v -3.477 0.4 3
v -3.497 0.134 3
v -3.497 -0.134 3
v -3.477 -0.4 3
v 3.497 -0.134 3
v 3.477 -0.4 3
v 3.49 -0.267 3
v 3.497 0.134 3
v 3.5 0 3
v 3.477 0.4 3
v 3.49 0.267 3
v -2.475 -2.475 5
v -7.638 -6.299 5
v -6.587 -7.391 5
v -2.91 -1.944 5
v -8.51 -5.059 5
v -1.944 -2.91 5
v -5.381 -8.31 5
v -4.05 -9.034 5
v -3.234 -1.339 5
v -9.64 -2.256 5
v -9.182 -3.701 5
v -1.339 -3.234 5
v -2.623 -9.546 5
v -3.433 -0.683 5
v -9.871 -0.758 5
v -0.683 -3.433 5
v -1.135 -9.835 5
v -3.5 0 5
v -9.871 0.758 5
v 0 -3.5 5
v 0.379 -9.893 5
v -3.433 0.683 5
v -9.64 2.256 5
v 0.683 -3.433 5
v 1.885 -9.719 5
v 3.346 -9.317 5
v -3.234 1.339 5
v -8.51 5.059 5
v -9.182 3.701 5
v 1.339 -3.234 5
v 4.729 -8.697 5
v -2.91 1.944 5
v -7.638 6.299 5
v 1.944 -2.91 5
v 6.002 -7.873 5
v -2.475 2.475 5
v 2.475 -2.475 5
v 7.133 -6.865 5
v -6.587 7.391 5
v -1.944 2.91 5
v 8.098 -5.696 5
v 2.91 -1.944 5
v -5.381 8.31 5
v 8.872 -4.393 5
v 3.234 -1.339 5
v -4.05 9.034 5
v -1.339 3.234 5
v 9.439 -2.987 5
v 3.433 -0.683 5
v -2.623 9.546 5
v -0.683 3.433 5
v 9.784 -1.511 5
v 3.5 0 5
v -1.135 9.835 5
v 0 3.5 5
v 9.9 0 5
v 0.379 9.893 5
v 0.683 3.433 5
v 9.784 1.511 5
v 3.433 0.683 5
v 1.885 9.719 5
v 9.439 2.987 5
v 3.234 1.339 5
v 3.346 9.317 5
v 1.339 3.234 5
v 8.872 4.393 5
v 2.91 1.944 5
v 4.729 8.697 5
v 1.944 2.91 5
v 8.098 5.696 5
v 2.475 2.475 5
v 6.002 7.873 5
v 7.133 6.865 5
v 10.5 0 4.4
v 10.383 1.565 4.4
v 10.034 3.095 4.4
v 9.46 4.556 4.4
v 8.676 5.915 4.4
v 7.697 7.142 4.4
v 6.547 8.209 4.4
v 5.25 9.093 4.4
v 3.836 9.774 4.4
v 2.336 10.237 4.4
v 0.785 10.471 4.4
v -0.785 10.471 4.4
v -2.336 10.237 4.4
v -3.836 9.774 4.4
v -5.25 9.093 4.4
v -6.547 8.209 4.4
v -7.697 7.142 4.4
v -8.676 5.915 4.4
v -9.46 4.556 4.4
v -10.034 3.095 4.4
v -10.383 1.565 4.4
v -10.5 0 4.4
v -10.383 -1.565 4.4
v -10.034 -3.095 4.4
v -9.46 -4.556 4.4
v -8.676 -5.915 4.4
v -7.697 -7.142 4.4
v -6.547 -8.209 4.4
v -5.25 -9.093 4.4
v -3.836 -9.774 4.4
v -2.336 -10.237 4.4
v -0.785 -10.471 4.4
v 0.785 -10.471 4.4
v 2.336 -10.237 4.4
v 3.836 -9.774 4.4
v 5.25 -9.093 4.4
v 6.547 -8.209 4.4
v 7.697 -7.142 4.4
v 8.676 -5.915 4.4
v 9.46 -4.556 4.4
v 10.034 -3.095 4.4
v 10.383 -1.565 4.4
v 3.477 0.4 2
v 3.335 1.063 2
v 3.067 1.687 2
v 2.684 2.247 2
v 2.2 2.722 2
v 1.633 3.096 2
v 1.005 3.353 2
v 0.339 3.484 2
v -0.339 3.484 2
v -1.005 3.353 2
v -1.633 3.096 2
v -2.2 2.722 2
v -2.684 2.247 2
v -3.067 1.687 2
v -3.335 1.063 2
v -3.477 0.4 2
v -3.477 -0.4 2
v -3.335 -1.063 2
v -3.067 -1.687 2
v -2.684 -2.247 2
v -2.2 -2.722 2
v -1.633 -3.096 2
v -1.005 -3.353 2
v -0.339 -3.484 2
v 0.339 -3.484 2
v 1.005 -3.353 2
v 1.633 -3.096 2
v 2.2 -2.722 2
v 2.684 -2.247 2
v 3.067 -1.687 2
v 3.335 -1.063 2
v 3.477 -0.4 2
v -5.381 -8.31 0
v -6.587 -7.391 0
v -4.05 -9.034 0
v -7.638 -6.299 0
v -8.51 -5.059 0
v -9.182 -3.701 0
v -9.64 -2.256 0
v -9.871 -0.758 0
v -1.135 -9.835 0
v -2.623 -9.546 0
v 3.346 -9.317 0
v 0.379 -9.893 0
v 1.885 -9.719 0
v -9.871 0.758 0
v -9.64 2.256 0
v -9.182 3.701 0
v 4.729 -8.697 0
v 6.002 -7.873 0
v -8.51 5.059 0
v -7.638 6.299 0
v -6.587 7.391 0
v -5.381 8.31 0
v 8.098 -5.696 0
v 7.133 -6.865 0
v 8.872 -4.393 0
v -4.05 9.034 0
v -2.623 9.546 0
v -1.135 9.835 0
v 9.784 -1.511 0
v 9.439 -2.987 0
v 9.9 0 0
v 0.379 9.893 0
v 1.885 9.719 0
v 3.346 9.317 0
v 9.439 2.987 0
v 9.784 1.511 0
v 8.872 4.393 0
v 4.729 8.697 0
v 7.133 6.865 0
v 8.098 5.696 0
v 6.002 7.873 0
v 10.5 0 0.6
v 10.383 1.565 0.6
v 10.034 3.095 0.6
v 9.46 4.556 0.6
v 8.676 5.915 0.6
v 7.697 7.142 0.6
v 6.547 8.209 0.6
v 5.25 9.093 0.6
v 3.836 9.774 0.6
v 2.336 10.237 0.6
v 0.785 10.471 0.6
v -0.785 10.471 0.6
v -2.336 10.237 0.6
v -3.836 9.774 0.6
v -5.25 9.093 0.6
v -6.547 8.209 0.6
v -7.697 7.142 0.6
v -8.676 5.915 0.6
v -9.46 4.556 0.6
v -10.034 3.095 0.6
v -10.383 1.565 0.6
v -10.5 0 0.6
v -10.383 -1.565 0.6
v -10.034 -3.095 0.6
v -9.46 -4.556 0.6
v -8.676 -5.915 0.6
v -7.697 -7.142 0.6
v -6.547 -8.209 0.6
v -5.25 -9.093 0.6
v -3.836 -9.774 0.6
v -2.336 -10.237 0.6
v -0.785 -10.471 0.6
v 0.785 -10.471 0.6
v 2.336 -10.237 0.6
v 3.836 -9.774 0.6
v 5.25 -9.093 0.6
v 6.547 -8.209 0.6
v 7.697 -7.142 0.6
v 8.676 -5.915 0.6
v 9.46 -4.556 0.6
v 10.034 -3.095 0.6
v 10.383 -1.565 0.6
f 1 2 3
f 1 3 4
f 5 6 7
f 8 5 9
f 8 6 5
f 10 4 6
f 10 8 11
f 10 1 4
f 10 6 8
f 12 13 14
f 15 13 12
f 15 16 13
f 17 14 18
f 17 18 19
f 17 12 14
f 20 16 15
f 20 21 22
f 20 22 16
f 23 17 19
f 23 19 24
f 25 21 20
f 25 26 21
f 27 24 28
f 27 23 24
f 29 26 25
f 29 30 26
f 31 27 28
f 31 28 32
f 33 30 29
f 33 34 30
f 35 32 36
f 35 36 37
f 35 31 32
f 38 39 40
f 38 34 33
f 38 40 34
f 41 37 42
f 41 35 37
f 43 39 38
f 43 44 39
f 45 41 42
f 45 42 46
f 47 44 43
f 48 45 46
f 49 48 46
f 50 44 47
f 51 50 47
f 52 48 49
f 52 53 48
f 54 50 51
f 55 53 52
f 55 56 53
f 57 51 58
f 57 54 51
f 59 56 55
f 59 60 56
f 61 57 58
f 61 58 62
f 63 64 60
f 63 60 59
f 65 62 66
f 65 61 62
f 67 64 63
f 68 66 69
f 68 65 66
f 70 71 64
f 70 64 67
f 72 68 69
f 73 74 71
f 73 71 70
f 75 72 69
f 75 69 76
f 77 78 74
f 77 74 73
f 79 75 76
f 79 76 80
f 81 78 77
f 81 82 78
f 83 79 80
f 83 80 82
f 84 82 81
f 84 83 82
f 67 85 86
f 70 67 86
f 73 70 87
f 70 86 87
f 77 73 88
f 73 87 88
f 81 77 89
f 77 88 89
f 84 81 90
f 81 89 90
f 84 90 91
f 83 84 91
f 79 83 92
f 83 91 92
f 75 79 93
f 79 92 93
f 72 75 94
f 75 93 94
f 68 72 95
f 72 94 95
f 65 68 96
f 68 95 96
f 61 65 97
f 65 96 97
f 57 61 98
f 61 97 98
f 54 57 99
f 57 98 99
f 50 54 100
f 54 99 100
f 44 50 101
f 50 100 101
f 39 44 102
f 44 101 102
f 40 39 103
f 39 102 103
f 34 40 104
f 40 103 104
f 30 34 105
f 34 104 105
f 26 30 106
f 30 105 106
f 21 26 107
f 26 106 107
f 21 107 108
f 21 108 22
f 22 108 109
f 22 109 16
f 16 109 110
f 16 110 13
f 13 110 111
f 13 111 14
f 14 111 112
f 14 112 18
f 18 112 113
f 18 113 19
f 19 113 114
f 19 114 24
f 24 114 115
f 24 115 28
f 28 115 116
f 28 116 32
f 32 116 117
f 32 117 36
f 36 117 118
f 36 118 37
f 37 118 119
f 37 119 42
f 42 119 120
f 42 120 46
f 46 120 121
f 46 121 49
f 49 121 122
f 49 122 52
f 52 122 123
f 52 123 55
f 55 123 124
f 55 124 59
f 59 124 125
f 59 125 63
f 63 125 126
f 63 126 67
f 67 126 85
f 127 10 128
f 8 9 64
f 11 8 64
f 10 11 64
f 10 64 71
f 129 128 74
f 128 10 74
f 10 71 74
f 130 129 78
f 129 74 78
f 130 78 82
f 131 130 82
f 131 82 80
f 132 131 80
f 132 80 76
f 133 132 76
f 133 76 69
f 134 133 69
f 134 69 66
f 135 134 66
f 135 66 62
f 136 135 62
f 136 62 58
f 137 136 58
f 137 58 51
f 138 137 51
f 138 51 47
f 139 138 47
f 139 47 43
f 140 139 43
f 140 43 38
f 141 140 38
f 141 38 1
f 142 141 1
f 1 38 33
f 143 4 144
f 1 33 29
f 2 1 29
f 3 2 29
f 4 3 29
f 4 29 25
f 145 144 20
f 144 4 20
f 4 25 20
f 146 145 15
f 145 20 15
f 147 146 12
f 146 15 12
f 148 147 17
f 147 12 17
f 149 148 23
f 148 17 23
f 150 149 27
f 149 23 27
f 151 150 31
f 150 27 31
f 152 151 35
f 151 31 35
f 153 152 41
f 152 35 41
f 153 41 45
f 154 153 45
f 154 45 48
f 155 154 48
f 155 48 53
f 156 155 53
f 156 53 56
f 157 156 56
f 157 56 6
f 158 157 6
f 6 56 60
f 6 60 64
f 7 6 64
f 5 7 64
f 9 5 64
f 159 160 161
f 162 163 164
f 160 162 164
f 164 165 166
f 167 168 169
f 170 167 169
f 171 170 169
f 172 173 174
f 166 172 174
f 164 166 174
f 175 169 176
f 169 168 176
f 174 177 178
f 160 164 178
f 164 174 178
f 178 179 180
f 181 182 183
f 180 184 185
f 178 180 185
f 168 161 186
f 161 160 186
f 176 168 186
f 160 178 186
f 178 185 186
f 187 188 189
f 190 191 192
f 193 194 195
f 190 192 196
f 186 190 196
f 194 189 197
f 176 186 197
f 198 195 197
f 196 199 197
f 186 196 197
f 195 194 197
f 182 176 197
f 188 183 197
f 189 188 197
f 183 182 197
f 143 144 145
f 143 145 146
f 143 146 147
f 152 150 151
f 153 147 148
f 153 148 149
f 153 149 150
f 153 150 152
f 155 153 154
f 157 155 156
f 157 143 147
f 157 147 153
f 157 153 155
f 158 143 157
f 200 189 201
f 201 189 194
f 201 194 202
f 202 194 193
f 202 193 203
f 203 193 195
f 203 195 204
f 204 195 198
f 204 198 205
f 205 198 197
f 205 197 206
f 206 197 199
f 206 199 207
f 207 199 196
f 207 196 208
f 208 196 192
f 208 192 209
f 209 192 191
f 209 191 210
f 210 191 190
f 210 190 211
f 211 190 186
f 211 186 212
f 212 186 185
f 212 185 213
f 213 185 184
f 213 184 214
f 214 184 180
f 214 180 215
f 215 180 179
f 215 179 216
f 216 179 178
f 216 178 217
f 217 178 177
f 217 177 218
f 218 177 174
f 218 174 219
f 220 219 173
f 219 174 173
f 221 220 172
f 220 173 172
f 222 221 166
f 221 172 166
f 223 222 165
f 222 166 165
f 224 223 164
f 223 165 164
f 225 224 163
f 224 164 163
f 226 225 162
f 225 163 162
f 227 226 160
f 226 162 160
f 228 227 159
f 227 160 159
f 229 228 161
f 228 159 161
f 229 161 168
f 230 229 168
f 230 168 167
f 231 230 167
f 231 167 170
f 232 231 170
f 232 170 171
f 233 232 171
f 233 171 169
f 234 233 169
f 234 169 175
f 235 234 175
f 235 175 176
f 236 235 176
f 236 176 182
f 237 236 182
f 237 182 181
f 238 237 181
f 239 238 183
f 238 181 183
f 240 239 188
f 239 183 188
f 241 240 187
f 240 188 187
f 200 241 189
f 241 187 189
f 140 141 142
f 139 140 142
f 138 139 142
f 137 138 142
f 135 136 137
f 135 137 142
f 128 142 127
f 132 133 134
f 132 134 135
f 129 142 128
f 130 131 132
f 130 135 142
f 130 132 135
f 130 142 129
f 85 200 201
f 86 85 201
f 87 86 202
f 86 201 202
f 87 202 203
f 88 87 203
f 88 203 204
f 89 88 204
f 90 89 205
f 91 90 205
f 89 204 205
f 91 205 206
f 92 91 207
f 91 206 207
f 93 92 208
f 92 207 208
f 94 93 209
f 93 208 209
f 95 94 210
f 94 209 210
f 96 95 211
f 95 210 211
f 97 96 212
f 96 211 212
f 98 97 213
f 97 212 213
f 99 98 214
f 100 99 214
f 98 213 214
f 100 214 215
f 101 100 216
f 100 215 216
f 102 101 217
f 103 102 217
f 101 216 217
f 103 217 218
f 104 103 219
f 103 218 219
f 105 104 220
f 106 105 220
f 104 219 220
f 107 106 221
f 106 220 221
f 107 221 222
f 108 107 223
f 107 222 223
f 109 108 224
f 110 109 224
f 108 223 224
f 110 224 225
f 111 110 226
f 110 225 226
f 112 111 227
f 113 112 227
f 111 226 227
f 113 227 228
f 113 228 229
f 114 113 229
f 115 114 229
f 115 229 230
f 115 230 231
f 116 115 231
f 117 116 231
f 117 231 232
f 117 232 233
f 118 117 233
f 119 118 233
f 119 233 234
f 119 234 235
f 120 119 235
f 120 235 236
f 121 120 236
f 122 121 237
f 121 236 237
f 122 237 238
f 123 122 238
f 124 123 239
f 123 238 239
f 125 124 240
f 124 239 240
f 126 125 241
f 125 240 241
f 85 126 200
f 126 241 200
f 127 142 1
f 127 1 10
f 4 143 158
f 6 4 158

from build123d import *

# Parameters (mm, degrees)
F0_R     = 10.5
F1_DEPTH = 5
F2_R     = 3.5
F3_DEPTH = 3
F4_W     = 8
F4_H     = 0.8
F5_DEPTH = 1
F6_SIZE  = 0.6


with BuildPart() as f1:
    # F0 (on Top) → F1 (new body)
    with BuildSketch(Plane.XY):
        Circle(F0_R)
    extrude(amount=F1_DEPTH)

    # F2 (on face) → F3 (cut)
    with BuildSketch(Plane.XY.offset(5)):
        Circle(F2_R)
    extrude(amount=-F3_DEPTH, mode=Mode.SUBTRACT)

    # F4 (on face) → F5 (join)
    with BuildSketch(Plane.XY.offset(2)):
        Rectangle(F4_W, F4_H)
    extrude(amount=F5_DEPTH)

    # F6
    f6_edges = [f1.edges().sort_by_distance(p)[0] for p in [
        (-10.5, 0, 5),
        (-10.5, 0, 0),
    ]]
    chamfer(f6_edges, length=F6_SIZE)


solid = f1.part
